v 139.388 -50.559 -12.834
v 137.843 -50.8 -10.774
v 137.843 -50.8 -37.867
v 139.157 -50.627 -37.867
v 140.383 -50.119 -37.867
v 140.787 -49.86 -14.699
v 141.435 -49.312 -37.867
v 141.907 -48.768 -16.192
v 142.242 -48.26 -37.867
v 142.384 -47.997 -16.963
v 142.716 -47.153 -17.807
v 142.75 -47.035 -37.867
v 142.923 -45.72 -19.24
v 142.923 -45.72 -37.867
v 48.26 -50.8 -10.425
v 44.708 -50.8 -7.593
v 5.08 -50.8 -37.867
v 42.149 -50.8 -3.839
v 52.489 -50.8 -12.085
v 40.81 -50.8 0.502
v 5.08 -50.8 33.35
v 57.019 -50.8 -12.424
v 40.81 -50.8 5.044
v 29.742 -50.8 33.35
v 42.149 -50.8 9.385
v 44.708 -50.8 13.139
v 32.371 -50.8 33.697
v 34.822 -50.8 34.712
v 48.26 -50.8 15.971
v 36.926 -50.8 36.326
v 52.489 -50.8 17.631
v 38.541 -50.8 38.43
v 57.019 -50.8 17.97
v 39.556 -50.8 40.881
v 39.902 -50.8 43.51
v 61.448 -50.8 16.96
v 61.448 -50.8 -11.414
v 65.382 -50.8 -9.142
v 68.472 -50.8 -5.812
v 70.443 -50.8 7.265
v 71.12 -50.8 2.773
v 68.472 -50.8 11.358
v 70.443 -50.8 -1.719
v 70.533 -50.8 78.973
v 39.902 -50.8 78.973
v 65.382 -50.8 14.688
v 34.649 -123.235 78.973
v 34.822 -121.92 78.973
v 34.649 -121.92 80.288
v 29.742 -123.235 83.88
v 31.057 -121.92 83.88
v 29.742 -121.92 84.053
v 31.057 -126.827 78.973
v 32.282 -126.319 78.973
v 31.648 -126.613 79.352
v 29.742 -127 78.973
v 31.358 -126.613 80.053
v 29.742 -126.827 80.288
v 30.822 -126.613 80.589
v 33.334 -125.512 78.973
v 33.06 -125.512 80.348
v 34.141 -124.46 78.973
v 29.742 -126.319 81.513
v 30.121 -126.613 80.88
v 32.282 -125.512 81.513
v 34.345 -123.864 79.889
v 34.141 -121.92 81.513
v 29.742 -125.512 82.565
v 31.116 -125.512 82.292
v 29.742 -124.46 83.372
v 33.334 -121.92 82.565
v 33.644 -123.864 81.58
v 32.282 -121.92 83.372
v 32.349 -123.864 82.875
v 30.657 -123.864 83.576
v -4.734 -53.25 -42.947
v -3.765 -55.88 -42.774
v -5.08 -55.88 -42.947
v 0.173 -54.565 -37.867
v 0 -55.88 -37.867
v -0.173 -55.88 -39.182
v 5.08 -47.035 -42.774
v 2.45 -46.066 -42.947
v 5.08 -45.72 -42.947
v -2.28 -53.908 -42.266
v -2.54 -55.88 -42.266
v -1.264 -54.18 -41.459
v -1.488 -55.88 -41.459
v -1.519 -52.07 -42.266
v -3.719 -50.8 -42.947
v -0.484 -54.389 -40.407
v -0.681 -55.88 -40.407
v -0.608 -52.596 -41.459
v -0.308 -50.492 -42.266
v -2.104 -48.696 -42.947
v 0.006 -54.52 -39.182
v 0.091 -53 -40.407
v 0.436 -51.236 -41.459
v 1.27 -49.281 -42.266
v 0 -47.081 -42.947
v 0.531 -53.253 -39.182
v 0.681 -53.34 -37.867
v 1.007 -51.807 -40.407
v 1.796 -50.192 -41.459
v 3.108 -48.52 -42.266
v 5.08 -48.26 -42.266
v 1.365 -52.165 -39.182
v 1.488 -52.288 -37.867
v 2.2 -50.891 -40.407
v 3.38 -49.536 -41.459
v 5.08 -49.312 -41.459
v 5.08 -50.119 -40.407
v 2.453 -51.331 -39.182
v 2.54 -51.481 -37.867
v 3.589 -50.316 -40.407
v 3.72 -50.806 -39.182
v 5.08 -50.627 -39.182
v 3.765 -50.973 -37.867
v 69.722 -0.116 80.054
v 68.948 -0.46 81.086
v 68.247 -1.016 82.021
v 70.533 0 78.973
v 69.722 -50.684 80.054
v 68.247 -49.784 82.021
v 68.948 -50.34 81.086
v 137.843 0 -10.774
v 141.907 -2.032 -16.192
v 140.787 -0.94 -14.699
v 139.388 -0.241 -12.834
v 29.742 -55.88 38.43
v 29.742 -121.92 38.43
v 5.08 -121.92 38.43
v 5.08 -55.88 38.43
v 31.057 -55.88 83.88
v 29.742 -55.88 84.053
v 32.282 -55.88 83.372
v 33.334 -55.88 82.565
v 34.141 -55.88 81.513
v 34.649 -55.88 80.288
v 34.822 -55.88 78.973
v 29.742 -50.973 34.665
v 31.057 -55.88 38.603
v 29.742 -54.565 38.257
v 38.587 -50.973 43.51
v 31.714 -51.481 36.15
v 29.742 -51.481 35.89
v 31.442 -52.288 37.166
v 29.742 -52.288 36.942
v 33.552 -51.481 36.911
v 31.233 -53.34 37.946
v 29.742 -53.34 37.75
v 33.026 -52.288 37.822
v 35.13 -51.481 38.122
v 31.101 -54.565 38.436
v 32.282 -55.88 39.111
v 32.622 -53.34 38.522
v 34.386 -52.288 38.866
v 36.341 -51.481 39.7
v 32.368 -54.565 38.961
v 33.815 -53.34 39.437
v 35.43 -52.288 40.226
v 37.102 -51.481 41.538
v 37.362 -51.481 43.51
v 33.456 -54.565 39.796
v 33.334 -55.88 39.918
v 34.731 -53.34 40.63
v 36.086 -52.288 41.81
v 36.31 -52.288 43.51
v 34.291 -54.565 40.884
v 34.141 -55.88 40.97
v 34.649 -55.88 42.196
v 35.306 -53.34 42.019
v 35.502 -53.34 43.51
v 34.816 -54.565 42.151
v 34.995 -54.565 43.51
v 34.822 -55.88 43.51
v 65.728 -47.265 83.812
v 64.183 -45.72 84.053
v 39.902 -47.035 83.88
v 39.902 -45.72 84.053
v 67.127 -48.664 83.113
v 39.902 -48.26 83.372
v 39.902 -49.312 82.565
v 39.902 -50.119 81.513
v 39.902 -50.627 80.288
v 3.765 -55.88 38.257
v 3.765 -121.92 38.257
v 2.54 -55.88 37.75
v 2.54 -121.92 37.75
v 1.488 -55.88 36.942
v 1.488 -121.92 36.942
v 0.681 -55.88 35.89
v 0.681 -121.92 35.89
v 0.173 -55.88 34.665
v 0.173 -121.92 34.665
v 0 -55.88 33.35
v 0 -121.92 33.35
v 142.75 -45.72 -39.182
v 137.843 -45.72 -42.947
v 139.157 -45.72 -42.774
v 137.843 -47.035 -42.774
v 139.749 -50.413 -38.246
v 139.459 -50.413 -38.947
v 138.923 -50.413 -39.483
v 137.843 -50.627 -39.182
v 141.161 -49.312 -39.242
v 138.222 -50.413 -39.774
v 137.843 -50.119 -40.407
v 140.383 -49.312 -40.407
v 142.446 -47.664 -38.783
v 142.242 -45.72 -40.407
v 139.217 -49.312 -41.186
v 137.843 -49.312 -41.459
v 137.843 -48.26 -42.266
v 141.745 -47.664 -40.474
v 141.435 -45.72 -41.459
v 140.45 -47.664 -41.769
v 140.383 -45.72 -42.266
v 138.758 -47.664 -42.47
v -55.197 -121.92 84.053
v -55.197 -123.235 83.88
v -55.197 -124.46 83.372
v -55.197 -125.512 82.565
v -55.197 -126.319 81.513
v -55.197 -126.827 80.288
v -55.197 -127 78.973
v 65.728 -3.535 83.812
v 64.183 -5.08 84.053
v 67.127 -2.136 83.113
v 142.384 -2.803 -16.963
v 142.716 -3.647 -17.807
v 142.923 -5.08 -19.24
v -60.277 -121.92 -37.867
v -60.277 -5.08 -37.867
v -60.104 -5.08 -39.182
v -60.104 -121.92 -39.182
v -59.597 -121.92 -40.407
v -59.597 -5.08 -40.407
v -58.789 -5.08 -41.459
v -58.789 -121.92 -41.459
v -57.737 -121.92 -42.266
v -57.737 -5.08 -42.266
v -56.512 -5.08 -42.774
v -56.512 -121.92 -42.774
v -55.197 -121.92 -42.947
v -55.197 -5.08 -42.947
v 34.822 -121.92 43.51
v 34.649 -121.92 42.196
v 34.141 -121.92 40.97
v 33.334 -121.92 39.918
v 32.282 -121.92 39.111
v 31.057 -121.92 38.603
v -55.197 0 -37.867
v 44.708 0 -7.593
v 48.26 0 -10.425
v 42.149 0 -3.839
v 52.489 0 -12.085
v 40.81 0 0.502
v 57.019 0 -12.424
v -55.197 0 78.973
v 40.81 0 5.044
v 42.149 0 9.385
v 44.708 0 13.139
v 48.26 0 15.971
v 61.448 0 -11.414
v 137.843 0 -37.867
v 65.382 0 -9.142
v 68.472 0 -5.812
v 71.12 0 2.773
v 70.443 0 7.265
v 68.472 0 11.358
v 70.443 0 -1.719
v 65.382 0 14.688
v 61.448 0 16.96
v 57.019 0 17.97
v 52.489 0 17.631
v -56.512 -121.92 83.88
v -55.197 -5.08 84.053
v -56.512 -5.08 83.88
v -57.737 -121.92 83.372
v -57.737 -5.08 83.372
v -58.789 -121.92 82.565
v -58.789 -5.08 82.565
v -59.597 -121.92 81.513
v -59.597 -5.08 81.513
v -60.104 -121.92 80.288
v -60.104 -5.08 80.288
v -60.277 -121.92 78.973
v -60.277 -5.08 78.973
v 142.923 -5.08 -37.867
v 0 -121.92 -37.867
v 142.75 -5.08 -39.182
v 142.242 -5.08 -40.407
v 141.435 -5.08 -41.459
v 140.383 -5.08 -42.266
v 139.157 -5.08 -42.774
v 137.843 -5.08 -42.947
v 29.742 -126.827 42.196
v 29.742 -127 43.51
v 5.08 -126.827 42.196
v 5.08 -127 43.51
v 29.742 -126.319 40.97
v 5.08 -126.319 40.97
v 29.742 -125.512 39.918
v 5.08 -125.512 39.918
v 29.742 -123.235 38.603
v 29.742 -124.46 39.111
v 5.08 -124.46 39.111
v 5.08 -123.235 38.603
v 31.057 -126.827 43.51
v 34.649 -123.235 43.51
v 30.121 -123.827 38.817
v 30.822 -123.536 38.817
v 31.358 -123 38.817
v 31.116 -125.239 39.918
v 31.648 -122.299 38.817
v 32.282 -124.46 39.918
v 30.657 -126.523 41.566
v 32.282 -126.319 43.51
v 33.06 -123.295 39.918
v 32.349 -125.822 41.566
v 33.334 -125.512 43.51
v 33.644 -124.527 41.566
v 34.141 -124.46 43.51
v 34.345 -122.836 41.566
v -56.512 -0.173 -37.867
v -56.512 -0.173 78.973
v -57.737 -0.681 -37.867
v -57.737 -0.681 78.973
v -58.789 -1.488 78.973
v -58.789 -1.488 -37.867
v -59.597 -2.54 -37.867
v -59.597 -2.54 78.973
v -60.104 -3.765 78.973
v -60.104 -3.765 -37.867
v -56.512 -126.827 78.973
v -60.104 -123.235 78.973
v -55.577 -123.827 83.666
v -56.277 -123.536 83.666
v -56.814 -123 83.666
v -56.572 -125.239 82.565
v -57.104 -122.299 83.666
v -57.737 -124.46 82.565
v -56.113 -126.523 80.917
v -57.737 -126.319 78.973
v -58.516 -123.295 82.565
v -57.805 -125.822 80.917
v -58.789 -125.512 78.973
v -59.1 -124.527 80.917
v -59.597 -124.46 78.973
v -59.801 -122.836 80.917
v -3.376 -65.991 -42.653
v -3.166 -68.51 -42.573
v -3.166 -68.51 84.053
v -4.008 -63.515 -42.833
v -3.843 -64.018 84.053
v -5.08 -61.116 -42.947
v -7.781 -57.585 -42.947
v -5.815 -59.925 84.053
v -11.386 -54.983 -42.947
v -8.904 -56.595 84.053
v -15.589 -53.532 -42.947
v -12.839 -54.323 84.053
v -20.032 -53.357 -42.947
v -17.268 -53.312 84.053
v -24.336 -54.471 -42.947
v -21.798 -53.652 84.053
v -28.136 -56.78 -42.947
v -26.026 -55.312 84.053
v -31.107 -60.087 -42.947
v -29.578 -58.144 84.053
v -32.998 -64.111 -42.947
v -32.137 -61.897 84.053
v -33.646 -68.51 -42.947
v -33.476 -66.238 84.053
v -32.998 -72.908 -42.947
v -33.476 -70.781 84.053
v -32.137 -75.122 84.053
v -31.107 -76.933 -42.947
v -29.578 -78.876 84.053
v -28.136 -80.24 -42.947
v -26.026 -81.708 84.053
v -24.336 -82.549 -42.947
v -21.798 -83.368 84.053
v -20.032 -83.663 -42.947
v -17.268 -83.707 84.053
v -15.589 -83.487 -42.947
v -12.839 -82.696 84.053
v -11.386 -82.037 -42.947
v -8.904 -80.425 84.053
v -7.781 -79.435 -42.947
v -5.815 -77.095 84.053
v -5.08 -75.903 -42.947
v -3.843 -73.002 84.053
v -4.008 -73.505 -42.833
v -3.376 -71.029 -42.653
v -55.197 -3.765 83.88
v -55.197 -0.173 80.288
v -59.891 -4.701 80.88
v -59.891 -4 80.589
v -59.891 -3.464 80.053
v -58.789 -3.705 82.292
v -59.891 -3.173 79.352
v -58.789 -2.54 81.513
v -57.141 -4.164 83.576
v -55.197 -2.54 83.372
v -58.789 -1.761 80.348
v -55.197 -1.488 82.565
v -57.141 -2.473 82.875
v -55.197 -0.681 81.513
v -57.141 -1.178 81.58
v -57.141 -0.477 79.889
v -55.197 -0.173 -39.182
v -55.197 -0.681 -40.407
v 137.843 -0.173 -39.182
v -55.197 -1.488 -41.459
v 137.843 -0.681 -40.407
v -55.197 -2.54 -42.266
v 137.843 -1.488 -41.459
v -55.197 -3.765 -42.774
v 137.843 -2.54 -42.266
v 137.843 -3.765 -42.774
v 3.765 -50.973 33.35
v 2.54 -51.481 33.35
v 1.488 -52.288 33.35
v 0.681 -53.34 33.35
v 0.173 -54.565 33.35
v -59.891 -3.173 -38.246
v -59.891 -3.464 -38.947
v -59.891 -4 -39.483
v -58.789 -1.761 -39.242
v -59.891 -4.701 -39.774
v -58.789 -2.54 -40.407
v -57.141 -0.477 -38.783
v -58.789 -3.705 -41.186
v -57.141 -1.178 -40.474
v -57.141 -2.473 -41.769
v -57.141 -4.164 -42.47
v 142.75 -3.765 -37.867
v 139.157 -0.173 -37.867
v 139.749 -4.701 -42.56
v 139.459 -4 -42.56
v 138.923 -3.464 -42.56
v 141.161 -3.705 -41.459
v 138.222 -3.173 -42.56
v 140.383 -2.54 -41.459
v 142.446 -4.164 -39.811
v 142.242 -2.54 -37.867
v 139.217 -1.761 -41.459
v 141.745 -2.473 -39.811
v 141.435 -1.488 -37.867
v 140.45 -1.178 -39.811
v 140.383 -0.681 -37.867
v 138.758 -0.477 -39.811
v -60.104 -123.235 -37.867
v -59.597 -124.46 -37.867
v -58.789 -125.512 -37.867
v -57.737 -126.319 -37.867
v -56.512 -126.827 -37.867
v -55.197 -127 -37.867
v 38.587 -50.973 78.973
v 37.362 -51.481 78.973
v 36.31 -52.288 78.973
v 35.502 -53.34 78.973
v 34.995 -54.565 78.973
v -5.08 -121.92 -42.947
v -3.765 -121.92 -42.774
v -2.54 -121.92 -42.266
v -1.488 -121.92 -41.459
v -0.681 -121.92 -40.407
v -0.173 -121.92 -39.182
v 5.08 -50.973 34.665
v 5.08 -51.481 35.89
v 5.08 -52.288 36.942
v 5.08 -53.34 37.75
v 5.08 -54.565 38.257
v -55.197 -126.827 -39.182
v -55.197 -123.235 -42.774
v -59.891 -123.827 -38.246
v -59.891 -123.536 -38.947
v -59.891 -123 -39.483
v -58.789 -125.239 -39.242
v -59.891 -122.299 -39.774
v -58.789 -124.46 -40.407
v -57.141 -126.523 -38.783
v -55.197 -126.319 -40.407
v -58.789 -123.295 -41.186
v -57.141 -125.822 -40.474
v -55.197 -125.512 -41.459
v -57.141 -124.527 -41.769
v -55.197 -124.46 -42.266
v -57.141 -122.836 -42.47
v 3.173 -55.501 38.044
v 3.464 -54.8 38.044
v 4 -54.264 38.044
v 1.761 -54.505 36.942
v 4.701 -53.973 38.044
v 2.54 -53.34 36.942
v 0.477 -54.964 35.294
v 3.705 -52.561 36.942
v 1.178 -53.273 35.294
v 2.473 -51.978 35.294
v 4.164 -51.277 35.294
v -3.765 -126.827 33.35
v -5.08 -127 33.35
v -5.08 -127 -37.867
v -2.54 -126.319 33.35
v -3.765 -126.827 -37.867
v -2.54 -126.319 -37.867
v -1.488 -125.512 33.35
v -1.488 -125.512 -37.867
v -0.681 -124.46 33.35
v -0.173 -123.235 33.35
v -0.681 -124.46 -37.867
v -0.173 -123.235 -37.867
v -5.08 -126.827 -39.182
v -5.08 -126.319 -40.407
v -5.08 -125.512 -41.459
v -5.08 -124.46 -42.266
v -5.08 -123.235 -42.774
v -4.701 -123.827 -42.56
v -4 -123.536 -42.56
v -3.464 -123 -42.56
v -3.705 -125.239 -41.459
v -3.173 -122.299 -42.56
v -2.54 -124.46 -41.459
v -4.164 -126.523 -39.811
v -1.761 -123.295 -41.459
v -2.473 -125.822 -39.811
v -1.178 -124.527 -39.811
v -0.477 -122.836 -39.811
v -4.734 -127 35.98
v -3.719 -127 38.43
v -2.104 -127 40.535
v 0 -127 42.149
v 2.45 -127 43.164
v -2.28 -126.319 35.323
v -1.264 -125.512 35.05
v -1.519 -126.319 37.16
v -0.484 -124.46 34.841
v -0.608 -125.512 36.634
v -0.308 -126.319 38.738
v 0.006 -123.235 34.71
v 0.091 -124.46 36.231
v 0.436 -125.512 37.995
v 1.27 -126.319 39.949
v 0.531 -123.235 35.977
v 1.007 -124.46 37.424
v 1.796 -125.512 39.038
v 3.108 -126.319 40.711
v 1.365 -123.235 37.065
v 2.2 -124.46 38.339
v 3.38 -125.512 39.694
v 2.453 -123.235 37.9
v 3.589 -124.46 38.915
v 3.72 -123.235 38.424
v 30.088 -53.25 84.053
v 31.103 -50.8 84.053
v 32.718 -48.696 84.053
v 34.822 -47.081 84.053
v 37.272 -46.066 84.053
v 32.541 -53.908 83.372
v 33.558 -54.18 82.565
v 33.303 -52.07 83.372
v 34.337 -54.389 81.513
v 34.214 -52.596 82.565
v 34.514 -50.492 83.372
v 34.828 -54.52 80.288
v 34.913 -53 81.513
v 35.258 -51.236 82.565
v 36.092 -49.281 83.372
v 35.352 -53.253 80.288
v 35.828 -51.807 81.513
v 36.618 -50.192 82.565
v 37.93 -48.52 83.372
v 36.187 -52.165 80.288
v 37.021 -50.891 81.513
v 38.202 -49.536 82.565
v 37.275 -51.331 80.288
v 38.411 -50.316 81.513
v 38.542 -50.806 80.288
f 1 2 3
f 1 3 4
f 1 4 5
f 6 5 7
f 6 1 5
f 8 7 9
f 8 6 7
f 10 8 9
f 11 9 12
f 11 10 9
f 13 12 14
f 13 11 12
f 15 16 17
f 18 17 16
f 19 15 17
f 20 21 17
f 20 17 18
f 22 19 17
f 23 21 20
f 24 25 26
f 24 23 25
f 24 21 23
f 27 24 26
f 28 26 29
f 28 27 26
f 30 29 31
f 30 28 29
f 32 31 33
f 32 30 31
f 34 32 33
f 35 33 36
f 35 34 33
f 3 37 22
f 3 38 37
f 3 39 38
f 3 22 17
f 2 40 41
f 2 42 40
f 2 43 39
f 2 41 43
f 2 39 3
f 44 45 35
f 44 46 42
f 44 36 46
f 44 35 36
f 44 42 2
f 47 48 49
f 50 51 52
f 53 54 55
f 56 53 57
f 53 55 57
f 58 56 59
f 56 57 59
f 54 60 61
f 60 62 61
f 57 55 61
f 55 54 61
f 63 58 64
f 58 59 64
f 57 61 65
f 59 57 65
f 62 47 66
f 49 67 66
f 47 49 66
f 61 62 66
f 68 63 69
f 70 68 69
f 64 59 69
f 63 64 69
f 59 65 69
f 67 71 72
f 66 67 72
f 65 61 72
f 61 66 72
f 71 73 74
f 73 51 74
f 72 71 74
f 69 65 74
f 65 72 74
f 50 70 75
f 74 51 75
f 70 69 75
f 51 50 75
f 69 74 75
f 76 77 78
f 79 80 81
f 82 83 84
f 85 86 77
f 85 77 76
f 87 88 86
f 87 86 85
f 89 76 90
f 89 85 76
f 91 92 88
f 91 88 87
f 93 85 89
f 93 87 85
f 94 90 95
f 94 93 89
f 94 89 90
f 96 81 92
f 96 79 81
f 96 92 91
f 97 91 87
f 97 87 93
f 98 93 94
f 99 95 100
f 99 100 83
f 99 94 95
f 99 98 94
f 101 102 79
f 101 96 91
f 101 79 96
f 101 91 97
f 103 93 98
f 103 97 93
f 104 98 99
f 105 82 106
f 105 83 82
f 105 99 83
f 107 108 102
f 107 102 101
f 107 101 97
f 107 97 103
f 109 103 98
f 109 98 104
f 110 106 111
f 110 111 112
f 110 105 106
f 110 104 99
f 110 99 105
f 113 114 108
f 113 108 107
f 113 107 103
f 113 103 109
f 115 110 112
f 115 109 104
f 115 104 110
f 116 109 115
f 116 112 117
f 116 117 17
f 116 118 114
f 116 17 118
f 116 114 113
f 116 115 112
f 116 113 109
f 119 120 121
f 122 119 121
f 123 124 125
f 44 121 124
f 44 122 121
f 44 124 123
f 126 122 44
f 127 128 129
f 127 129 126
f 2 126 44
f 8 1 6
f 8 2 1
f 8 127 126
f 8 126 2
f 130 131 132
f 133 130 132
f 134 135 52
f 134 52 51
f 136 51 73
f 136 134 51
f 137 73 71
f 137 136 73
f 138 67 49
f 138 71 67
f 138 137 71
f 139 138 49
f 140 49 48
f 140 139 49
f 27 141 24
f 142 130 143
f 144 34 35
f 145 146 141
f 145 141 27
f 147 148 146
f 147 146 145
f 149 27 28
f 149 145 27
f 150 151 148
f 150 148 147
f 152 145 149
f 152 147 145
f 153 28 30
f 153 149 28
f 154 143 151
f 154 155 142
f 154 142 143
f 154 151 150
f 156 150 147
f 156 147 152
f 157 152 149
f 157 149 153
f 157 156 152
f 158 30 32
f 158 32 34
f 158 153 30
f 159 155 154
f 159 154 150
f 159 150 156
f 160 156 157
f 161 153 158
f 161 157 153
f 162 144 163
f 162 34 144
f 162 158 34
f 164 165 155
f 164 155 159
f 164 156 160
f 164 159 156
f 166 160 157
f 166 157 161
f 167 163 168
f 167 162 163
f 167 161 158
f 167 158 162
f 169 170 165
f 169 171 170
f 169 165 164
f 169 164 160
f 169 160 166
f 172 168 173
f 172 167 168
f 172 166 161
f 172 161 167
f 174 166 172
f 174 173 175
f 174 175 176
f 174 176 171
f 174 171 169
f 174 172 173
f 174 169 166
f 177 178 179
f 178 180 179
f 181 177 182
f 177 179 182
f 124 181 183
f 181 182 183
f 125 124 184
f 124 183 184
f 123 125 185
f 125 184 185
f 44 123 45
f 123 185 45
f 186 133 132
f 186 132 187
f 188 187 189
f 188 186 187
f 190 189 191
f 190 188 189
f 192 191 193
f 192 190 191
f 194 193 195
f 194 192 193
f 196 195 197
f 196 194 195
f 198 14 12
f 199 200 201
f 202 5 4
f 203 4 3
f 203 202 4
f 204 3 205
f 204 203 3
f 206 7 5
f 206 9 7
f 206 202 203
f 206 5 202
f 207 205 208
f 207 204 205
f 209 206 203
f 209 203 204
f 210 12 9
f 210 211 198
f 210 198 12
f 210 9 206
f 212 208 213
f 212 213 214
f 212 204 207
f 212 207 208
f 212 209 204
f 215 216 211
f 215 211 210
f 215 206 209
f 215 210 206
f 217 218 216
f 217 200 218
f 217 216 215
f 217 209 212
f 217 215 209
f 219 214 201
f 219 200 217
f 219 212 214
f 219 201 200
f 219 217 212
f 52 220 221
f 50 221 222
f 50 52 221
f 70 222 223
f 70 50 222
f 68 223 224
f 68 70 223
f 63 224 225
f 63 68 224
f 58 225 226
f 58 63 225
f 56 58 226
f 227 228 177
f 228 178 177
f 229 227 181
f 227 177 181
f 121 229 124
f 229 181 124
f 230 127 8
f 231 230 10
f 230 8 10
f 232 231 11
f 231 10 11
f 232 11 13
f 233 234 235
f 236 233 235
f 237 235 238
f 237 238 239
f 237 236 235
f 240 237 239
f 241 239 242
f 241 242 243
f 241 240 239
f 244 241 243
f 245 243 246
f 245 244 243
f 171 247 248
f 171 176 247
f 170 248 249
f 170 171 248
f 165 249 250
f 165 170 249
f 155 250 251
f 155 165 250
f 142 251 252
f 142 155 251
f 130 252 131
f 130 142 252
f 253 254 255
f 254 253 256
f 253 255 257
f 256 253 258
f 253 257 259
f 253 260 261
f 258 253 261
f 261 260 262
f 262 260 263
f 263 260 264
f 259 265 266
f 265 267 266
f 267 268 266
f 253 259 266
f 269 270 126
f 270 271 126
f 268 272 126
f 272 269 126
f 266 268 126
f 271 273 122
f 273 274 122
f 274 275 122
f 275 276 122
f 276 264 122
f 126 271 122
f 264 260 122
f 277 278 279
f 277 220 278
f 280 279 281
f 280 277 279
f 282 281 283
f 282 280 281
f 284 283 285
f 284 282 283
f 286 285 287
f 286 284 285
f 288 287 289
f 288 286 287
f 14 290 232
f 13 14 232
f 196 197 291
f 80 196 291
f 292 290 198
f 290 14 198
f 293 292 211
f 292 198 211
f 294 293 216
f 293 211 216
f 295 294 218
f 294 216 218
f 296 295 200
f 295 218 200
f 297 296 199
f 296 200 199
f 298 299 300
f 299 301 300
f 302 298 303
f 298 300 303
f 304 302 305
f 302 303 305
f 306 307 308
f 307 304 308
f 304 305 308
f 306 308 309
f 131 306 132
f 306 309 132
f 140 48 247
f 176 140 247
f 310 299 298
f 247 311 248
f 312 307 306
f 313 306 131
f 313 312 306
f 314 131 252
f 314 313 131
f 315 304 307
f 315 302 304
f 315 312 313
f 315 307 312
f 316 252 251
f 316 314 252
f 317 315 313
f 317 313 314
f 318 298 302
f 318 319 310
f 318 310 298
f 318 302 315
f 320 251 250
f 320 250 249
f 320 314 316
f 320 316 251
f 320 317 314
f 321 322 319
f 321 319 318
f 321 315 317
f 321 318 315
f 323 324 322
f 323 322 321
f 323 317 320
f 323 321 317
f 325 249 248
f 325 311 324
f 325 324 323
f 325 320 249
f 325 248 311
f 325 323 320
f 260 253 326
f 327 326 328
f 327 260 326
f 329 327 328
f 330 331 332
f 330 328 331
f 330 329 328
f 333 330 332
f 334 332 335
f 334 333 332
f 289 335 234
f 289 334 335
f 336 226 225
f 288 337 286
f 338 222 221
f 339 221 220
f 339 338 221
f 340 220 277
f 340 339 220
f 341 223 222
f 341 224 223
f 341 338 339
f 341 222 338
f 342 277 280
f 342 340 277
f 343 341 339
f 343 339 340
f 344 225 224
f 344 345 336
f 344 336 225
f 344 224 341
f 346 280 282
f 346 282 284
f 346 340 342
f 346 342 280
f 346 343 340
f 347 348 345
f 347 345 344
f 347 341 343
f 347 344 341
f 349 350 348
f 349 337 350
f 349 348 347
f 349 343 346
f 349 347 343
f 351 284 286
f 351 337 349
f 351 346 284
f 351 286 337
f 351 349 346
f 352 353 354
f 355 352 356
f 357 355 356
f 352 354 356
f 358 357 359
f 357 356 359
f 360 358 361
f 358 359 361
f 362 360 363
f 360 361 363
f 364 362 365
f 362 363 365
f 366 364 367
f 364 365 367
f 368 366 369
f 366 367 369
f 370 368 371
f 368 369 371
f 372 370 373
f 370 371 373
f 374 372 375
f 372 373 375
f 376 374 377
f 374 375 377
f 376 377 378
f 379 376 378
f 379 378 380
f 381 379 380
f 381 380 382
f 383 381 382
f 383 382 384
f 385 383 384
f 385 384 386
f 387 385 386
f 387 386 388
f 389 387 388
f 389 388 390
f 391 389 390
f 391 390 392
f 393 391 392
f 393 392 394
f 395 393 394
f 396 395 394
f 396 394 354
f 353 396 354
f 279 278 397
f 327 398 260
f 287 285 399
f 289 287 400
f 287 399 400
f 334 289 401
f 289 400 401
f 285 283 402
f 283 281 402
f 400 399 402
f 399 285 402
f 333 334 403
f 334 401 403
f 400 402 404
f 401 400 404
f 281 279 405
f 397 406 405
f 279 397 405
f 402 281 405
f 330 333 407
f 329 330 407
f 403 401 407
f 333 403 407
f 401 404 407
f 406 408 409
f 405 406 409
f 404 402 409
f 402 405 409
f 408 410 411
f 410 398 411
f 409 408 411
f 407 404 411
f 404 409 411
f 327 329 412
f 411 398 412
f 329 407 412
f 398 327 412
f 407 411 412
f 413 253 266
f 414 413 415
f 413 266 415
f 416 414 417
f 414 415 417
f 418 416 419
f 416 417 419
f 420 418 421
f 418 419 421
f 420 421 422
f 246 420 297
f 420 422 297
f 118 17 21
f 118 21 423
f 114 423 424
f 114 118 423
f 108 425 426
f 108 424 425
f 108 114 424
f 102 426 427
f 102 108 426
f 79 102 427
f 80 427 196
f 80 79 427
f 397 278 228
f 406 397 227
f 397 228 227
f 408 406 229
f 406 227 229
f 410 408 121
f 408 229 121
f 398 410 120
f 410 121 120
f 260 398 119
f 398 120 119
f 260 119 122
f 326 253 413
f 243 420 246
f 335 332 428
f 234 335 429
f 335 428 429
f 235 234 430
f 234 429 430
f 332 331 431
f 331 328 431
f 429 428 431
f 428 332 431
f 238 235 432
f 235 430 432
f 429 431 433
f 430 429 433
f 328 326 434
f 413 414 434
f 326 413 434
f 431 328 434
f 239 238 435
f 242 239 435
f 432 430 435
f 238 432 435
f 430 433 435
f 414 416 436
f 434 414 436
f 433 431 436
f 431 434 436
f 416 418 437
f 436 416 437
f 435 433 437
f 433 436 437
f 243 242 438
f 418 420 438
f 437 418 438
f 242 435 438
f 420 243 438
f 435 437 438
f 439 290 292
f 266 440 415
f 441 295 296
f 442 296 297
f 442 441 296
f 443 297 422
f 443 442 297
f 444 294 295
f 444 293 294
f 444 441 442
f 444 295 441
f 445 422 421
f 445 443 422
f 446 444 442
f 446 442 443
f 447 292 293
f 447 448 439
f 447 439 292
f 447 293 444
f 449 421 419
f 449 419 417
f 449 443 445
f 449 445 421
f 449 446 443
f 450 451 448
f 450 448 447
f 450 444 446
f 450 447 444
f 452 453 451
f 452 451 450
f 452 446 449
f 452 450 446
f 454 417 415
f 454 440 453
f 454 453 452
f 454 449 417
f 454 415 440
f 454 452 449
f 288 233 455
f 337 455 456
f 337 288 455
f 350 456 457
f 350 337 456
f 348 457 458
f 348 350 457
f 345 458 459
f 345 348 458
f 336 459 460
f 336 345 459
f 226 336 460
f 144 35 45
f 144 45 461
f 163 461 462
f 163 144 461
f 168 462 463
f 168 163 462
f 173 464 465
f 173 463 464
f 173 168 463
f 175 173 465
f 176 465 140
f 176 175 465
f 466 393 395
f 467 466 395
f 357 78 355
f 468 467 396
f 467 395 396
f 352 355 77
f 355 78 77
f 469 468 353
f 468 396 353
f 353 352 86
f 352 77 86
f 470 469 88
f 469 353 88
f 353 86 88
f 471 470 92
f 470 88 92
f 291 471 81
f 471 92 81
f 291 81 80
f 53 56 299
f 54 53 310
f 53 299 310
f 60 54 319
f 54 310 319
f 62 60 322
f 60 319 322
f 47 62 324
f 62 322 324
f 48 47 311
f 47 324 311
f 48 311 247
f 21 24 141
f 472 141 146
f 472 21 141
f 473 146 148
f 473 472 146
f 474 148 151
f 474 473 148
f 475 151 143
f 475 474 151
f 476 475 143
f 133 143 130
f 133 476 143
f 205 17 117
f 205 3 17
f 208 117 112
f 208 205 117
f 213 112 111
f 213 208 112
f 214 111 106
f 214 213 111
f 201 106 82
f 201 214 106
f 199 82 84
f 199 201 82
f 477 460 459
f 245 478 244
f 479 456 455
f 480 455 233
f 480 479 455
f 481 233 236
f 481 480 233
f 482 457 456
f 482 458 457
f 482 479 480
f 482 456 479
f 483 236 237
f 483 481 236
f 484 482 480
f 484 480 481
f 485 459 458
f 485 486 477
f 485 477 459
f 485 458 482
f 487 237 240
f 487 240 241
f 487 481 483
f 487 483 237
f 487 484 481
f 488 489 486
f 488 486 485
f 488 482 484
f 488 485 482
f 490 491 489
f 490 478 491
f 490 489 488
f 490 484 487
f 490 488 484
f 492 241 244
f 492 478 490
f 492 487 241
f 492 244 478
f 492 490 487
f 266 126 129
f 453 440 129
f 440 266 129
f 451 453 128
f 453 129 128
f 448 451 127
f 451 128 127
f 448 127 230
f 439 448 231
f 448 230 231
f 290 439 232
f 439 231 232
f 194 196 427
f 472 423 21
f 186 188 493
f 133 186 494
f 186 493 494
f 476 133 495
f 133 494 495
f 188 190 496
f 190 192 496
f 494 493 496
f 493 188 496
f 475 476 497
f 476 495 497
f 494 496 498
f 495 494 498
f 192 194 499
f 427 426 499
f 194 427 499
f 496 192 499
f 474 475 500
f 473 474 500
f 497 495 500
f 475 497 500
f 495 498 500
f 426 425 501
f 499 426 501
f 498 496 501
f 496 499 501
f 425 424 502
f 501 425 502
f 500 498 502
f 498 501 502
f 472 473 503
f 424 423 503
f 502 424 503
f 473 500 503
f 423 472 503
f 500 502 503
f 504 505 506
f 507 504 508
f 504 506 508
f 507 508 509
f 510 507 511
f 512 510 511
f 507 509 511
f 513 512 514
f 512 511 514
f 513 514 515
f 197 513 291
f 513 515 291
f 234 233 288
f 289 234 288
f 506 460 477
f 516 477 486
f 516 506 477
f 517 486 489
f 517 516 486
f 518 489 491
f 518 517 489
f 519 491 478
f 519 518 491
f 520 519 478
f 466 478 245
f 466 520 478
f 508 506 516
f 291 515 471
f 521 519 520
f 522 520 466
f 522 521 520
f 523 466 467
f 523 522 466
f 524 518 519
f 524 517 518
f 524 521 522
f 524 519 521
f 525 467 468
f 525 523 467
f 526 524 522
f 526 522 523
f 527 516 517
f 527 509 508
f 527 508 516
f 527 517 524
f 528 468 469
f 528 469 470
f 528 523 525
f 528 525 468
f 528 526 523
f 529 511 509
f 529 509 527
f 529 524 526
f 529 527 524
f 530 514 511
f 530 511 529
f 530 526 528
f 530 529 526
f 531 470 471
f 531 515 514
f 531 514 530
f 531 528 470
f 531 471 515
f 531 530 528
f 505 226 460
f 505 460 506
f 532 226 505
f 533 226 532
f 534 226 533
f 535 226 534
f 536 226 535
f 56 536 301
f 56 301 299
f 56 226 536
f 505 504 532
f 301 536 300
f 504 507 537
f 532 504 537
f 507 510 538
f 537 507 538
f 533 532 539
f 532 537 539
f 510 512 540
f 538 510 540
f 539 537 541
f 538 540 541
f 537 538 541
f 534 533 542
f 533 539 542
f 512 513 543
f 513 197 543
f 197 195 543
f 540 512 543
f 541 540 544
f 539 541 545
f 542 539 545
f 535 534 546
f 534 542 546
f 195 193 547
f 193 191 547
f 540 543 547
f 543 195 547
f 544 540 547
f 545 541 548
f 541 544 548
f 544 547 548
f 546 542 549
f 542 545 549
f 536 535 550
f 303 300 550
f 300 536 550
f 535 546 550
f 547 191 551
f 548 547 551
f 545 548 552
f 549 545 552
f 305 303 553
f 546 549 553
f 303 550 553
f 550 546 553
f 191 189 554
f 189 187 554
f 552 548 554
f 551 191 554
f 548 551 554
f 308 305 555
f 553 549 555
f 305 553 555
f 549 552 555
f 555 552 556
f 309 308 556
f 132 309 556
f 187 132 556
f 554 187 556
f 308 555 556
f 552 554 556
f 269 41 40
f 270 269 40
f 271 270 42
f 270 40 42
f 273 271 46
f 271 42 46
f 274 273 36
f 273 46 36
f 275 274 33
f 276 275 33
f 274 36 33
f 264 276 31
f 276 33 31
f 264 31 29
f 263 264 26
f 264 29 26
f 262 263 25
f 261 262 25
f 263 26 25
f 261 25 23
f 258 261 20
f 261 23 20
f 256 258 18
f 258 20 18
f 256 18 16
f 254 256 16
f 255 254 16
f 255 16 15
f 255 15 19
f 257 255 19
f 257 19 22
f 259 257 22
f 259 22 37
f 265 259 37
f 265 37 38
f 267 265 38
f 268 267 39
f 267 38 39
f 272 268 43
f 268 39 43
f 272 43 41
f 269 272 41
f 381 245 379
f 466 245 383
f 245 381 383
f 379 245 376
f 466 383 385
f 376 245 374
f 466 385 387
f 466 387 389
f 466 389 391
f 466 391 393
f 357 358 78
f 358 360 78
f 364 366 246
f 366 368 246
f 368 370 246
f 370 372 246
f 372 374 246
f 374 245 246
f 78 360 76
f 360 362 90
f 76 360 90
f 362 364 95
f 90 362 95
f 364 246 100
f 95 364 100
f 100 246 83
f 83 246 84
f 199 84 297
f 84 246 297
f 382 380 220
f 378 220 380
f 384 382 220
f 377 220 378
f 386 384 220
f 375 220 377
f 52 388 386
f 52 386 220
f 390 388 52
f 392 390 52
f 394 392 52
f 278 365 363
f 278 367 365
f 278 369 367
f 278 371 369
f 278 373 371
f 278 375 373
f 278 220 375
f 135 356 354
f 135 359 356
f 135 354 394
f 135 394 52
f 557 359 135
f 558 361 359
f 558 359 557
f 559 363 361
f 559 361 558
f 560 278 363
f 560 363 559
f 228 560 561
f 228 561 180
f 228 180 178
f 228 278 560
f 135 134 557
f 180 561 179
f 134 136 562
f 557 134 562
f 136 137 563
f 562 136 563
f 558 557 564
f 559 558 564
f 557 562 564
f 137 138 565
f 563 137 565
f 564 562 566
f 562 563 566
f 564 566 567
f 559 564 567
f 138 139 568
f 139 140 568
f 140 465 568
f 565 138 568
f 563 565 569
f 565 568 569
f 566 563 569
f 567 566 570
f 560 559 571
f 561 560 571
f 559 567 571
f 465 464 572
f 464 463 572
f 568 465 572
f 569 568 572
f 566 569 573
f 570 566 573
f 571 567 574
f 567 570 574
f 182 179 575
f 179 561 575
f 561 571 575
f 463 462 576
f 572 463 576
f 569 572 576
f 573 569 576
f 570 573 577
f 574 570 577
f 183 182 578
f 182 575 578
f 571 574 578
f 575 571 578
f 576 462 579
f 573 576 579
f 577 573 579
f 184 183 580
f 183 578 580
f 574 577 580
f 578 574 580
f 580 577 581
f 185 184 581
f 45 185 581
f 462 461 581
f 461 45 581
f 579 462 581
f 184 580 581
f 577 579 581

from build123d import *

# Parameters (mm, degrees)
F0_W     = 203.2
F0_H     = 127
F1_DEPTH = 127
F3_DEPTH = 76.2
F4_SIZE2 = 101.6
F4_SIZE  = 76.2
F5_R     = 5.08
F6_R     = 15.24
F7_DEPTH = 50.8
F8_R     = 15.24
F9_DEPTH = 127


with BuildPart() as f1:
    # F0 (on Front) → F1 (new body)
    with BuildSketch(Plane.XZ):
        with Locations((41.3226257026, 20.5530026861)):
            Rectangle(F0_W, F0_H)
    extrude(amount=F1_DEPTH)

    # F2 (on face) → F3 (cut)
    with BuildSketch(Plane.XZ.offset(127)):
        Polygon((142.9226257026, 84.0530026861), (34.8217822611, 84.0530026861), (34.8217822611, 38.4303182364), (0, 38.4303182364), (0, -42.9469973139), (142.9226257026, -42.9469973139), align=None)
    extrude(amount=-F3_DEPTH, mode=Mode.SUBTRACT)

    # F4
    f4_edges = [f1.edges().sort_by_distance(p)[0] for p in [
        (142.922626, -25.4, 84.053003),
    ]]
    f4_side = f1.faces().sort_by_distance((19.028994, -51.591204, 84.053003))[0]
    chamfer(f4_edges, length=F4_SIZE, length2=F4_SIZE2, reference=f4_side)

    # F5
    f5_edges = [f1.edges().sort_by_distance(p)[0] for p in [
        (34.821782, -88.9, 84.053003),
        (0, -127, -2.25834),
        (50.772204, -50.8, 84.053003),
        (34.821782, -50.8, 61.24166),
        (34.821782, -127, 61.24166),
        (17.410891, -127, 38.430318),
        (-30.138687, -127, -42.946997),
        (-60.277374, -127, 20.553003),
        (-12.727796, -127, 84.053003),
        (3.222626, 0, 84.053003),
        (66.722626, -25.4, 84.053003),
        (-60.277374, -63.5, 84.053003),
        (0, -50.8, -2.25834),
        (0, -88.9, 38.430318),
        (0, -88.9, -42.946997),
        (142.922626, 0, -30.246997),
        (142.922626, -25.4, -17.546997),
        (142.922626, -25.4, -42.946997),
        (142.922626, -50.8, -30.246997),
        (41.322626, 0, -42.946997),
        (-60.277374, 0, 20.553003),
        (-60.277374, -63.5, -42.946997),
        (34.821782, -88.9, 38.430318),
        (17.410891, -50.8, 38.430318),
        (71.461313, -50.8, -42.946997),
    ]]
    fillet(f5_edges, radius=F5_R)

    # F6 (on face) → F7 (cut, through all)
    with BuildSketch(Plane.XZ.offset(50.8)):
        with Locations((55.88, 2.7730026861)):
            Circle(F6_R)
    extrude(amount=-F7_DEPTH, mode=Mode.SUBTRACT)

    # F8 (on face) → F9 (cut, through all)
    with BuildSketch(Plane.XY.offset(84.0530026861)):
        with Locations((-18.4064079076, -68.5097798705)):
            Circle(F8_R)
    extrude(amount=-F9_DEPTH, mode=Mode.SUBTRACT)


solid = f1.part
